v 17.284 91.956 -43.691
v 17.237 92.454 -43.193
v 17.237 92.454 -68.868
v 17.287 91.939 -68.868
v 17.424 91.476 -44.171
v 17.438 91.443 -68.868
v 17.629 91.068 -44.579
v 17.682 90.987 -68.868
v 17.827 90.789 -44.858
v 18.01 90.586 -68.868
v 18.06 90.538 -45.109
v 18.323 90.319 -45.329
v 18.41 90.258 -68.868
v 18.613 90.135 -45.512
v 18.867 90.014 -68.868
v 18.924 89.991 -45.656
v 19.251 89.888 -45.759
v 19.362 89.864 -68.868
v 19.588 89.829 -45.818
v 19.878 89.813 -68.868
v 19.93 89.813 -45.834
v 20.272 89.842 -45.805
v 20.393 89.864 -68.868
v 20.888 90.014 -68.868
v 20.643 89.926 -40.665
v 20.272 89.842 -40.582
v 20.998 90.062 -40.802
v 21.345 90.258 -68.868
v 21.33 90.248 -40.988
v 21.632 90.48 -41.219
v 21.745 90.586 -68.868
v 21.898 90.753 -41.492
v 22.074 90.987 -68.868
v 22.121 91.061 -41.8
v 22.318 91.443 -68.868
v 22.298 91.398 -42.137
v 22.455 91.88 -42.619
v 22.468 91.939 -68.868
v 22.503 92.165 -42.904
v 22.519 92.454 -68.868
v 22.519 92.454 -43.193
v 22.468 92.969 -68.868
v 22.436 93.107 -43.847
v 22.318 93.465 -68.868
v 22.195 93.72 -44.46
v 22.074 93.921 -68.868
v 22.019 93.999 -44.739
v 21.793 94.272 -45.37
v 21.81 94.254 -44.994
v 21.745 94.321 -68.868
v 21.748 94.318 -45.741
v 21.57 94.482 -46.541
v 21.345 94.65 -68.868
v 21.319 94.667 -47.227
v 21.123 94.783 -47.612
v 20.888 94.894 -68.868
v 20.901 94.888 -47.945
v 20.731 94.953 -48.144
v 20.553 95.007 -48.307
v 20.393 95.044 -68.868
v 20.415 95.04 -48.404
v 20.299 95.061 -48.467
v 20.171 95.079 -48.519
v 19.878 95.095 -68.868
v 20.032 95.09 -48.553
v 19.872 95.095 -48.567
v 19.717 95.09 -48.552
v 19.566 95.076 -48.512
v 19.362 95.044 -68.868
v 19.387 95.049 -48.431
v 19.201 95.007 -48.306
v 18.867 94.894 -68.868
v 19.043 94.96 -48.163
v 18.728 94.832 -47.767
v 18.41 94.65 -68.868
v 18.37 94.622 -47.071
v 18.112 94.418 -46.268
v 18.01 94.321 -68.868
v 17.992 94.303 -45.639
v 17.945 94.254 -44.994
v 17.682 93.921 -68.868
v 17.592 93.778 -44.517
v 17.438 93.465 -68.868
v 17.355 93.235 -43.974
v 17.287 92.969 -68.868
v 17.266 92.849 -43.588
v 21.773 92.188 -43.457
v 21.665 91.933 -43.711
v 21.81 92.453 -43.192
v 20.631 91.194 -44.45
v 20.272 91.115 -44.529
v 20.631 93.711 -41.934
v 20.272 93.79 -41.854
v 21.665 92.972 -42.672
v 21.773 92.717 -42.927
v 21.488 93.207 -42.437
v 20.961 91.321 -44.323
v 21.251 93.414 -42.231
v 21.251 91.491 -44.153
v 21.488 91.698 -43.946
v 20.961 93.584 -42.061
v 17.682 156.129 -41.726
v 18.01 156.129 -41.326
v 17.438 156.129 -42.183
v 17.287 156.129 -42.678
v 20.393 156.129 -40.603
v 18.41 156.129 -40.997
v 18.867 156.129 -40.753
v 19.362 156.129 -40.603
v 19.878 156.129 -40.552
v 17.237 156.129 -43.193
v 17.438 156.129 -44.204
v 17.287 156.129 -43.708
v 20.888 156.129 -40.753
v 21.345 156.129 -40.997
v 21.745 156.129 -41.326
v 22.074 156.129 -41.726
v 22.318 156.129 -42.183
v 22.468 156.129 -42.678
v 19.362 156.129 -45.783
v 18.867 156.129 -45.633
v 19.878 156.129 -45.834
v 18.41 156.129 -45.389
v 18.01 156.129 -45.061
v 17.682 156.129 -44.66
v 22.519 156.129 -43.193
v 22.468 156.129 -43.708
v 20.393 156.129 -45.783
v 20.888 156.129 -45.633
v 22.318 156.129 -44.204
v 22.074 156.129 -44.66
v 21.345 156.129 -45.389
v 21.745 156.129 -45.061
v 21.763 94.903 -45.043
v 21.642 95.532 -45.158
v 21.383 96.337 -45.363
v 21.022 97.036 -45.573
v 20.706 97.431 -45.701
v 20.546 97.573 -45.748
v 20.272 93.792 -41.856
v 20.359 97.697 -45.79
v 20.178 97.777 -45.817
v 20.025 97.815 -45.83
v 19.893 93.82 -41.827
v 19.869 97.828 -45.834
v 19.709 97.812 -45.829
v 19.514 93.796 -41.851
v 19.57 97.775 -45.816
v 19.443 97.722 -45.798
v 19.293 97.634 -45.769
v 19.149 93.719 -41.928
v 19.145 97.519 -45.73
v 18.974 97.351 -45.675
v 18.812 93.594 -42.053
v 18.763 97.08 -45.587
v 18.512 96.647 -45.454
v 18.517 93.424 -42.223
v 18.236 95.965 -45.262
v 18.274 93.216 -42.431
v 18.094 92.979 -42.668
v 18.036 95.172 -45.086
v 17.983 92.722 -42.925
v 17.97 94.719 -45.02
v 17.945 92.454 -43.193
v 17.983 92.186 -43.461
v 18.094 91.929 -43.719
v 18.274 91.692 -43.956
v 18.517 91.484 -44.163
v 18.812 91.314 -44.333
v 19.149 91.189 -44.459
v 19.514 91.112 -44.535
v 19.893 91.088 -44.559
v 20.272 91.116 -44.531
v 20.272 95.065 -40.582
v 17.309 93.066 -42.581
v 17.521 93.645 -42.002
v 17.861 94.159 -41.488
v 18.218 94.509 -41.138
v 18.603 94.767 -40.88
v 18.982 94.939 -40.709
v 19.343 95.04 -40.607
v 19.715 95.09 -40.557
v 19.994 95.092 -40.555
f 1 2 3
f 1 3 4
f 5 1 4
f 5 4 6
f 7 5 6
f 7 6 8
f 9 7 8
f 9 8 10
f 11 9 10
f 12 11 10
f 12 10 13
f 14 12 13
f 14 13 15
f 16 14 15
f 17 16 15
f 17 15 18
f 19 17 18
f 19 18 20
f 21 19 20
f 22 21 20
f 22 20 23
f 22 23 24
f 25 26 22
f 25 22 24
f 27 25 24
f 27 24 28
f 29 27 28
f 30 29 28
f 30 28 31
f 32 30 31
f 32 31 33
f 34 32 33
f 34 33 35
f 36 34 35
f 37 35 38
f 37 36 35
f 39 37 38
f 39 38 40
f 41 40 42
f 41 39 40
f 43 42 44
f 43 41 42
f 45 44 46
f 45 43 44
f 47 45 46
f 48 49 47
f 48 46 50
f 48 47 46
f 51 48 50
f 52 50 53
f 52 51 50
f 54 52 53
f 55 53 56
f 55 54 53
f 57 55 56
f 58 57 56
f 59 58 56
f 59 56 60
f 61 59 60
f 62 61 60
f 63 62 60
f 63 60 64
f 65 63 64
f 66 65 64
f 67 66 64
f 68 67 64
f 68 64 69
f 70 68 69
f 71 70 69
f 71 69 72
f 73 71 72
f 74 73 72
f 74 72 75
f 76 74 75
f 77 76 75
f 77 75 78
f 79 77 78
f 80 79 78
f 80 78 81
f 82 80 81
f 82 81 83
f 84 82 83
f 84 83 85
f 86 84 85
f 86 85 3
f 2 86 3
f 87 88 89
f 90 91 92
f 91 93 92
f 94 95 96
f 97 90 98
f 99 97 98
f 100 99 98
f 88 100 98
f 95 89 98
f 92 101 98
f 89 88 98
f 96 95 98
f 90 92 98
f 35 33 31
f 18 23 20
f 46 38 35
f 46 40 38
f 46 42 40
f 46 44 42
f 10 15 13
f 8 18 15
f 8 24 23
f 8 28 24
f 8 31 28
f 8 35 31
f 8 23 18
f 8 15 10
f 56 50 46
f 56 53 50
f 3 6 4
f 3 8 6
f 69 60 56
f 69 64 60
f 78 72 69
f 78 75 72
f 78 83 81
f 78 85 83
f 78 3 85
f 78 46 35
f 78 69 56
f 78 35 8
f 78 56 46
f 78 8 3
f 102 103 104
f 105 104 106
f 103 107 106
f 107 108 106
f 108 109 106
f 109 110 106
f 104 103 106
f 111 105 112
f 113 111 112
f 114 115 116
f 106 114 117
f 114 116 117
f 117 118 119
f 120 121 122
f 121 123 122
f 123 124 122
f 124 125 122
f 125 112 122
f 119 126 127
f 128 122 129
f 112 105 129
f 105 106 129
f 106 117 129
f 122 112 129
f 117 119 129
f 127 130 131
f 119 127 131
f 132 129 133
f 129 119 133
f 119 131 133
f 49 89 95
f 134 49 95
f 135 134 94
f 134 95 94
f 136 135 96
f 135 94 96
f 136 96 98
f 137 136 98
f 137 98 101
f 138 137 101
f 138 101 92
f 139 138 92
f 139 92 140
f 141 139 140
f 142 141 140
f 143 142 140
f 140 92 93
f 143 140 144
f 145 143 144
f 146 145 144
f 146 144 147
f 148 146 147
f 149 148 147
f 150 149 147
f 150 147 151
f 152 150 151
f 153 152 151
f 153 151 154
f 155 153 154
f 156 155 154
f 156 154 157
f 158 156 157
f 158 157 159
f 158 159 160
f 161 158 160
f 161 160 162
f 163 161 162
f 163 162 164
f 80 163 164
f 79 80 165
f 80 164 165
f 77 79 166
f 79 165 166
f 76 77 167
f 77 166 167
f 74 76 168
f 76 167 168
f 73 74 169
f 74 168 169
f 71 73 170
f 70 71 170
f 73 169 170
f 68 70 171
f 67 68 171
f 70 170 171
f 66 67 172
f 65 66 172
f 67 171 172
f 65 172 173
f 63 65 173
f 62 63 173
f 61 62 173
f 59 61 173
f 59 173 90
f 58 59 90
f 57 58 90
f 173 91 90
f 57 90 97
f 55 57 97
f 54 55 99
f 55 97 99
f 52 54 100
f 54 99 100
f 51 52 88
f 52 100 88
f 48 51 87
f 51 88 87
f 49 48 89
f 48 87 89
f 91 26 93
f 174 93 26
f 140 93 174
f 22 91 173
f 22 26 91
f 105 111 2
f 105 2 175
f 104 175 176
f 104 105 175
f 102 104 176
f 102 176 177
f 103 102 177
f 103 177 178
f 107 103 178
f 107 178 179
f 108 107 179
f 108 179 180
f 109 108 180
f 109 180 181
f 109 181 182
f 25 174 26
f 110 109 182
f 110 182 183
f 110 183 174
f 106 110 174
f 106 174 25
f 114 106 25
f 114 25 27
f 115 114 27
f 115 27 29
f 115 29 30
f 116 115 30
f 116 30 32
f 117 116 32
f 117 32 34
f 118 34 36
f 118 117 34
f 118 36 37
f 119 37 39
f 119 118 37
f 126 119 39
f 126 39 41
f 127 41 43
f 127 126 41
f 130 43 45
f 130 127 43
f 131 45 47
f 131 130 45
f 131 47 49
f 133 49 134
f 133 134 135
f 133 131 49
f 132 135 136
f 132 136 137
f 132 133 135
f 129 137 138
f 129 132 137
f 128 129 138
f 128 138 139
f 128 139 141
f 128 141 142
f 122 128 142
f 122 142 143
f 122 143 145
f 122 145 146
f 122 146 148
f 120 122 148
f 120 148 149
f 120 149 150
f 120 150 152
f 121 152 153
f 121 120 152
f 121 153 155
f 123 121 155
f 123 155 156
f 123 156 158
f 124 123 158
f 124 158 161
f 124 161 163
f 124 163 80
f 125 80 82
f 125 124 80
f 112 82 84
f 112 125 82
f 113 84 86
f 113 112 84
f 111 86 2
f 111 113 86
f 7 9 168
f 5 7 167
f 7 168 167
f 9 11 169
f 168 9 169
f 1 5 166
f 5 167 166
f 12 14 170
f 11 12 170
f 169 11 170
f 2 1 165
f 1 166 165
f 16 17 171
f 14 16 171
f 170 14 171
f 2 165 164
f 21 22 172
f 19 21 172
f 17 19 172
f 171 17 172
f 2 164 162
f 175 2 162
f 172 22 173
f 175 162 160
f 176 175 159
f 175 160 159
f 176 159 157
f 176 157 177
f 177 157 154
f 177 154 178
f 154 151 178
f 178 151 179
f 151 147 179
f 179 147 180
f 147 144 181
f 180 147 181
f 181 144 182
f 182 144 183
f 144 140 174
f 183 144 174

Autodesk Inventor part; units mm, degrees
ref_plane "YZ Plane" through (0, 0, 0) normal (1, 0, 0) x (0, 1, 0)
ref_plane "XZ Plane" through (0, 0, 0) normal (0, 1, 0) x (-1, 0, 0)
ref_plane "XY Plane" through (0, 0, 0) normal (0, 0, 1) x (1, 0, 0)
ref_plane "Work Plane1" through (15.2715, 198.3363, -46.0983) normal (-1, 0, 0) x (0, 1, 0)
sketch "Sketch1" plane through (15.2715, 198.3363, -46.0983) normal (-1, 0, 0) x (0, 1, 0)
  line L0 (-57.2075, -5.2313) -> (-57.2075, -7.2313)
  line L1 (-59.3325, 28.2487) -> (-59.3325, 9.0387)
  line L2 (-39.0825, 28.2487) -> (-39.0825, 9.0387)
  line L3 (-60.777, -7.2313) -> (-38.43, -7.2313) projected
  line L4 (-38.43, -0.2313) -> (-60.777, -0.2313) projected
  line L5 (-113.6123, 22.7696) -> (-98.1523, 22.7696) projected
  line L6 (-105.2077, 22.7696) -> (-105.2077, -2.2304)
  line L7 (-105.2077, -2.2304) -> (-42.2077, -2.2304)
  point P0 (-198.3363, -46.0983)
  dimension "d0" = 25
  dimension "d1" = 63
ref_plane "Work Plane2" through (20.8129, 75.0546, -60.4371) normal (0, 0, -1) x (-1, 0, 0)
sketch "Sketch2" plane through (20.8129, 75.0546, -60.4371) normal (0, 0, -1) x (-1, 0, 0)
  circle A0 centre (0.9353, 17.3993) radius 7.73 projected
  circle A1 centre (0.9353, 17.3993) radius 2.641
  point P0 (20.8129, -75.0546)
sweep "Sweep1" add profiles "Sketch2" path "Sketch1" path curves L6 L7 contours A1
sketch "Sketch3" plane through (15.2715, 198.3363, -46.0983) normal (-1, 0, 0) x (0, 1, 0)
  line L0 (-42.2077, -5.5462) -> (-42.2077, -0.2641) projected
  line L1 (-105.8823, -2.9051) -> (-105.8823, -2.9051) projected
  line L2 (-105.8823, -2.9051) -> (-105.8823, -2.9051) projected
  line L3 (-108.5234, 22.7696) -> (-103.2413, 22.7696) projected
  line L4 (-113.9183, 5.1309) -> (-96.4131, -12.3743)
  line L5 (-96.4131, -12.3743) -> (-115.0261, -30.9873)
  line L6 (-115.0261, -30.9873) -> (-132.5313, -13.4821)
  line L7 (-132.5313, -13.4821) -> (-113.9183, 5.1309)
  line L8 (-113.9183, 5.1309) -> (-89.1622, 5.1309) construction
  line L9 (-105.8823, 22.7696) -> (-105.8823, -27.9051)
  line L10 (-105.8823, -2.9051) -> (-105.8823, -2.9051) projected
  line L11 (-105.8823, -2.9051) -> (-105.8823, -2.9051) projected
  point P0 (-198.3363, -46.0983)
  dimension "d4" = 45
extrude "Extrusion1" cut sketch "Sketch3" along normal mid plane 10
sketch "Sketch4" plane through (19.8776, 92.454, -43.1932) normal (0, -0.7071, 0.7071) x (1, 0, 0)
  ellipse E0 centre (0, 0) end of major axis (0, -3.735) minor radius 2.641 (0.3939, 3.6932) -> (-2.641, 0) ccw projected
  ellipse E1 centre (0, 0) end of major axis (0, 3.735) minor radius 2.641 (-2.641, 0) -> (0.3939, -3.6932) ccw projected
  circle A0 centre (0, 0) radius 1.9322
  point P0 (-19.8776, -34.8326)
  point P1 (2.641, 0)
extrude "Extrusion2" cut sketch "Sketch4" against normal blind 10
properties part number "00_opticalpath"
